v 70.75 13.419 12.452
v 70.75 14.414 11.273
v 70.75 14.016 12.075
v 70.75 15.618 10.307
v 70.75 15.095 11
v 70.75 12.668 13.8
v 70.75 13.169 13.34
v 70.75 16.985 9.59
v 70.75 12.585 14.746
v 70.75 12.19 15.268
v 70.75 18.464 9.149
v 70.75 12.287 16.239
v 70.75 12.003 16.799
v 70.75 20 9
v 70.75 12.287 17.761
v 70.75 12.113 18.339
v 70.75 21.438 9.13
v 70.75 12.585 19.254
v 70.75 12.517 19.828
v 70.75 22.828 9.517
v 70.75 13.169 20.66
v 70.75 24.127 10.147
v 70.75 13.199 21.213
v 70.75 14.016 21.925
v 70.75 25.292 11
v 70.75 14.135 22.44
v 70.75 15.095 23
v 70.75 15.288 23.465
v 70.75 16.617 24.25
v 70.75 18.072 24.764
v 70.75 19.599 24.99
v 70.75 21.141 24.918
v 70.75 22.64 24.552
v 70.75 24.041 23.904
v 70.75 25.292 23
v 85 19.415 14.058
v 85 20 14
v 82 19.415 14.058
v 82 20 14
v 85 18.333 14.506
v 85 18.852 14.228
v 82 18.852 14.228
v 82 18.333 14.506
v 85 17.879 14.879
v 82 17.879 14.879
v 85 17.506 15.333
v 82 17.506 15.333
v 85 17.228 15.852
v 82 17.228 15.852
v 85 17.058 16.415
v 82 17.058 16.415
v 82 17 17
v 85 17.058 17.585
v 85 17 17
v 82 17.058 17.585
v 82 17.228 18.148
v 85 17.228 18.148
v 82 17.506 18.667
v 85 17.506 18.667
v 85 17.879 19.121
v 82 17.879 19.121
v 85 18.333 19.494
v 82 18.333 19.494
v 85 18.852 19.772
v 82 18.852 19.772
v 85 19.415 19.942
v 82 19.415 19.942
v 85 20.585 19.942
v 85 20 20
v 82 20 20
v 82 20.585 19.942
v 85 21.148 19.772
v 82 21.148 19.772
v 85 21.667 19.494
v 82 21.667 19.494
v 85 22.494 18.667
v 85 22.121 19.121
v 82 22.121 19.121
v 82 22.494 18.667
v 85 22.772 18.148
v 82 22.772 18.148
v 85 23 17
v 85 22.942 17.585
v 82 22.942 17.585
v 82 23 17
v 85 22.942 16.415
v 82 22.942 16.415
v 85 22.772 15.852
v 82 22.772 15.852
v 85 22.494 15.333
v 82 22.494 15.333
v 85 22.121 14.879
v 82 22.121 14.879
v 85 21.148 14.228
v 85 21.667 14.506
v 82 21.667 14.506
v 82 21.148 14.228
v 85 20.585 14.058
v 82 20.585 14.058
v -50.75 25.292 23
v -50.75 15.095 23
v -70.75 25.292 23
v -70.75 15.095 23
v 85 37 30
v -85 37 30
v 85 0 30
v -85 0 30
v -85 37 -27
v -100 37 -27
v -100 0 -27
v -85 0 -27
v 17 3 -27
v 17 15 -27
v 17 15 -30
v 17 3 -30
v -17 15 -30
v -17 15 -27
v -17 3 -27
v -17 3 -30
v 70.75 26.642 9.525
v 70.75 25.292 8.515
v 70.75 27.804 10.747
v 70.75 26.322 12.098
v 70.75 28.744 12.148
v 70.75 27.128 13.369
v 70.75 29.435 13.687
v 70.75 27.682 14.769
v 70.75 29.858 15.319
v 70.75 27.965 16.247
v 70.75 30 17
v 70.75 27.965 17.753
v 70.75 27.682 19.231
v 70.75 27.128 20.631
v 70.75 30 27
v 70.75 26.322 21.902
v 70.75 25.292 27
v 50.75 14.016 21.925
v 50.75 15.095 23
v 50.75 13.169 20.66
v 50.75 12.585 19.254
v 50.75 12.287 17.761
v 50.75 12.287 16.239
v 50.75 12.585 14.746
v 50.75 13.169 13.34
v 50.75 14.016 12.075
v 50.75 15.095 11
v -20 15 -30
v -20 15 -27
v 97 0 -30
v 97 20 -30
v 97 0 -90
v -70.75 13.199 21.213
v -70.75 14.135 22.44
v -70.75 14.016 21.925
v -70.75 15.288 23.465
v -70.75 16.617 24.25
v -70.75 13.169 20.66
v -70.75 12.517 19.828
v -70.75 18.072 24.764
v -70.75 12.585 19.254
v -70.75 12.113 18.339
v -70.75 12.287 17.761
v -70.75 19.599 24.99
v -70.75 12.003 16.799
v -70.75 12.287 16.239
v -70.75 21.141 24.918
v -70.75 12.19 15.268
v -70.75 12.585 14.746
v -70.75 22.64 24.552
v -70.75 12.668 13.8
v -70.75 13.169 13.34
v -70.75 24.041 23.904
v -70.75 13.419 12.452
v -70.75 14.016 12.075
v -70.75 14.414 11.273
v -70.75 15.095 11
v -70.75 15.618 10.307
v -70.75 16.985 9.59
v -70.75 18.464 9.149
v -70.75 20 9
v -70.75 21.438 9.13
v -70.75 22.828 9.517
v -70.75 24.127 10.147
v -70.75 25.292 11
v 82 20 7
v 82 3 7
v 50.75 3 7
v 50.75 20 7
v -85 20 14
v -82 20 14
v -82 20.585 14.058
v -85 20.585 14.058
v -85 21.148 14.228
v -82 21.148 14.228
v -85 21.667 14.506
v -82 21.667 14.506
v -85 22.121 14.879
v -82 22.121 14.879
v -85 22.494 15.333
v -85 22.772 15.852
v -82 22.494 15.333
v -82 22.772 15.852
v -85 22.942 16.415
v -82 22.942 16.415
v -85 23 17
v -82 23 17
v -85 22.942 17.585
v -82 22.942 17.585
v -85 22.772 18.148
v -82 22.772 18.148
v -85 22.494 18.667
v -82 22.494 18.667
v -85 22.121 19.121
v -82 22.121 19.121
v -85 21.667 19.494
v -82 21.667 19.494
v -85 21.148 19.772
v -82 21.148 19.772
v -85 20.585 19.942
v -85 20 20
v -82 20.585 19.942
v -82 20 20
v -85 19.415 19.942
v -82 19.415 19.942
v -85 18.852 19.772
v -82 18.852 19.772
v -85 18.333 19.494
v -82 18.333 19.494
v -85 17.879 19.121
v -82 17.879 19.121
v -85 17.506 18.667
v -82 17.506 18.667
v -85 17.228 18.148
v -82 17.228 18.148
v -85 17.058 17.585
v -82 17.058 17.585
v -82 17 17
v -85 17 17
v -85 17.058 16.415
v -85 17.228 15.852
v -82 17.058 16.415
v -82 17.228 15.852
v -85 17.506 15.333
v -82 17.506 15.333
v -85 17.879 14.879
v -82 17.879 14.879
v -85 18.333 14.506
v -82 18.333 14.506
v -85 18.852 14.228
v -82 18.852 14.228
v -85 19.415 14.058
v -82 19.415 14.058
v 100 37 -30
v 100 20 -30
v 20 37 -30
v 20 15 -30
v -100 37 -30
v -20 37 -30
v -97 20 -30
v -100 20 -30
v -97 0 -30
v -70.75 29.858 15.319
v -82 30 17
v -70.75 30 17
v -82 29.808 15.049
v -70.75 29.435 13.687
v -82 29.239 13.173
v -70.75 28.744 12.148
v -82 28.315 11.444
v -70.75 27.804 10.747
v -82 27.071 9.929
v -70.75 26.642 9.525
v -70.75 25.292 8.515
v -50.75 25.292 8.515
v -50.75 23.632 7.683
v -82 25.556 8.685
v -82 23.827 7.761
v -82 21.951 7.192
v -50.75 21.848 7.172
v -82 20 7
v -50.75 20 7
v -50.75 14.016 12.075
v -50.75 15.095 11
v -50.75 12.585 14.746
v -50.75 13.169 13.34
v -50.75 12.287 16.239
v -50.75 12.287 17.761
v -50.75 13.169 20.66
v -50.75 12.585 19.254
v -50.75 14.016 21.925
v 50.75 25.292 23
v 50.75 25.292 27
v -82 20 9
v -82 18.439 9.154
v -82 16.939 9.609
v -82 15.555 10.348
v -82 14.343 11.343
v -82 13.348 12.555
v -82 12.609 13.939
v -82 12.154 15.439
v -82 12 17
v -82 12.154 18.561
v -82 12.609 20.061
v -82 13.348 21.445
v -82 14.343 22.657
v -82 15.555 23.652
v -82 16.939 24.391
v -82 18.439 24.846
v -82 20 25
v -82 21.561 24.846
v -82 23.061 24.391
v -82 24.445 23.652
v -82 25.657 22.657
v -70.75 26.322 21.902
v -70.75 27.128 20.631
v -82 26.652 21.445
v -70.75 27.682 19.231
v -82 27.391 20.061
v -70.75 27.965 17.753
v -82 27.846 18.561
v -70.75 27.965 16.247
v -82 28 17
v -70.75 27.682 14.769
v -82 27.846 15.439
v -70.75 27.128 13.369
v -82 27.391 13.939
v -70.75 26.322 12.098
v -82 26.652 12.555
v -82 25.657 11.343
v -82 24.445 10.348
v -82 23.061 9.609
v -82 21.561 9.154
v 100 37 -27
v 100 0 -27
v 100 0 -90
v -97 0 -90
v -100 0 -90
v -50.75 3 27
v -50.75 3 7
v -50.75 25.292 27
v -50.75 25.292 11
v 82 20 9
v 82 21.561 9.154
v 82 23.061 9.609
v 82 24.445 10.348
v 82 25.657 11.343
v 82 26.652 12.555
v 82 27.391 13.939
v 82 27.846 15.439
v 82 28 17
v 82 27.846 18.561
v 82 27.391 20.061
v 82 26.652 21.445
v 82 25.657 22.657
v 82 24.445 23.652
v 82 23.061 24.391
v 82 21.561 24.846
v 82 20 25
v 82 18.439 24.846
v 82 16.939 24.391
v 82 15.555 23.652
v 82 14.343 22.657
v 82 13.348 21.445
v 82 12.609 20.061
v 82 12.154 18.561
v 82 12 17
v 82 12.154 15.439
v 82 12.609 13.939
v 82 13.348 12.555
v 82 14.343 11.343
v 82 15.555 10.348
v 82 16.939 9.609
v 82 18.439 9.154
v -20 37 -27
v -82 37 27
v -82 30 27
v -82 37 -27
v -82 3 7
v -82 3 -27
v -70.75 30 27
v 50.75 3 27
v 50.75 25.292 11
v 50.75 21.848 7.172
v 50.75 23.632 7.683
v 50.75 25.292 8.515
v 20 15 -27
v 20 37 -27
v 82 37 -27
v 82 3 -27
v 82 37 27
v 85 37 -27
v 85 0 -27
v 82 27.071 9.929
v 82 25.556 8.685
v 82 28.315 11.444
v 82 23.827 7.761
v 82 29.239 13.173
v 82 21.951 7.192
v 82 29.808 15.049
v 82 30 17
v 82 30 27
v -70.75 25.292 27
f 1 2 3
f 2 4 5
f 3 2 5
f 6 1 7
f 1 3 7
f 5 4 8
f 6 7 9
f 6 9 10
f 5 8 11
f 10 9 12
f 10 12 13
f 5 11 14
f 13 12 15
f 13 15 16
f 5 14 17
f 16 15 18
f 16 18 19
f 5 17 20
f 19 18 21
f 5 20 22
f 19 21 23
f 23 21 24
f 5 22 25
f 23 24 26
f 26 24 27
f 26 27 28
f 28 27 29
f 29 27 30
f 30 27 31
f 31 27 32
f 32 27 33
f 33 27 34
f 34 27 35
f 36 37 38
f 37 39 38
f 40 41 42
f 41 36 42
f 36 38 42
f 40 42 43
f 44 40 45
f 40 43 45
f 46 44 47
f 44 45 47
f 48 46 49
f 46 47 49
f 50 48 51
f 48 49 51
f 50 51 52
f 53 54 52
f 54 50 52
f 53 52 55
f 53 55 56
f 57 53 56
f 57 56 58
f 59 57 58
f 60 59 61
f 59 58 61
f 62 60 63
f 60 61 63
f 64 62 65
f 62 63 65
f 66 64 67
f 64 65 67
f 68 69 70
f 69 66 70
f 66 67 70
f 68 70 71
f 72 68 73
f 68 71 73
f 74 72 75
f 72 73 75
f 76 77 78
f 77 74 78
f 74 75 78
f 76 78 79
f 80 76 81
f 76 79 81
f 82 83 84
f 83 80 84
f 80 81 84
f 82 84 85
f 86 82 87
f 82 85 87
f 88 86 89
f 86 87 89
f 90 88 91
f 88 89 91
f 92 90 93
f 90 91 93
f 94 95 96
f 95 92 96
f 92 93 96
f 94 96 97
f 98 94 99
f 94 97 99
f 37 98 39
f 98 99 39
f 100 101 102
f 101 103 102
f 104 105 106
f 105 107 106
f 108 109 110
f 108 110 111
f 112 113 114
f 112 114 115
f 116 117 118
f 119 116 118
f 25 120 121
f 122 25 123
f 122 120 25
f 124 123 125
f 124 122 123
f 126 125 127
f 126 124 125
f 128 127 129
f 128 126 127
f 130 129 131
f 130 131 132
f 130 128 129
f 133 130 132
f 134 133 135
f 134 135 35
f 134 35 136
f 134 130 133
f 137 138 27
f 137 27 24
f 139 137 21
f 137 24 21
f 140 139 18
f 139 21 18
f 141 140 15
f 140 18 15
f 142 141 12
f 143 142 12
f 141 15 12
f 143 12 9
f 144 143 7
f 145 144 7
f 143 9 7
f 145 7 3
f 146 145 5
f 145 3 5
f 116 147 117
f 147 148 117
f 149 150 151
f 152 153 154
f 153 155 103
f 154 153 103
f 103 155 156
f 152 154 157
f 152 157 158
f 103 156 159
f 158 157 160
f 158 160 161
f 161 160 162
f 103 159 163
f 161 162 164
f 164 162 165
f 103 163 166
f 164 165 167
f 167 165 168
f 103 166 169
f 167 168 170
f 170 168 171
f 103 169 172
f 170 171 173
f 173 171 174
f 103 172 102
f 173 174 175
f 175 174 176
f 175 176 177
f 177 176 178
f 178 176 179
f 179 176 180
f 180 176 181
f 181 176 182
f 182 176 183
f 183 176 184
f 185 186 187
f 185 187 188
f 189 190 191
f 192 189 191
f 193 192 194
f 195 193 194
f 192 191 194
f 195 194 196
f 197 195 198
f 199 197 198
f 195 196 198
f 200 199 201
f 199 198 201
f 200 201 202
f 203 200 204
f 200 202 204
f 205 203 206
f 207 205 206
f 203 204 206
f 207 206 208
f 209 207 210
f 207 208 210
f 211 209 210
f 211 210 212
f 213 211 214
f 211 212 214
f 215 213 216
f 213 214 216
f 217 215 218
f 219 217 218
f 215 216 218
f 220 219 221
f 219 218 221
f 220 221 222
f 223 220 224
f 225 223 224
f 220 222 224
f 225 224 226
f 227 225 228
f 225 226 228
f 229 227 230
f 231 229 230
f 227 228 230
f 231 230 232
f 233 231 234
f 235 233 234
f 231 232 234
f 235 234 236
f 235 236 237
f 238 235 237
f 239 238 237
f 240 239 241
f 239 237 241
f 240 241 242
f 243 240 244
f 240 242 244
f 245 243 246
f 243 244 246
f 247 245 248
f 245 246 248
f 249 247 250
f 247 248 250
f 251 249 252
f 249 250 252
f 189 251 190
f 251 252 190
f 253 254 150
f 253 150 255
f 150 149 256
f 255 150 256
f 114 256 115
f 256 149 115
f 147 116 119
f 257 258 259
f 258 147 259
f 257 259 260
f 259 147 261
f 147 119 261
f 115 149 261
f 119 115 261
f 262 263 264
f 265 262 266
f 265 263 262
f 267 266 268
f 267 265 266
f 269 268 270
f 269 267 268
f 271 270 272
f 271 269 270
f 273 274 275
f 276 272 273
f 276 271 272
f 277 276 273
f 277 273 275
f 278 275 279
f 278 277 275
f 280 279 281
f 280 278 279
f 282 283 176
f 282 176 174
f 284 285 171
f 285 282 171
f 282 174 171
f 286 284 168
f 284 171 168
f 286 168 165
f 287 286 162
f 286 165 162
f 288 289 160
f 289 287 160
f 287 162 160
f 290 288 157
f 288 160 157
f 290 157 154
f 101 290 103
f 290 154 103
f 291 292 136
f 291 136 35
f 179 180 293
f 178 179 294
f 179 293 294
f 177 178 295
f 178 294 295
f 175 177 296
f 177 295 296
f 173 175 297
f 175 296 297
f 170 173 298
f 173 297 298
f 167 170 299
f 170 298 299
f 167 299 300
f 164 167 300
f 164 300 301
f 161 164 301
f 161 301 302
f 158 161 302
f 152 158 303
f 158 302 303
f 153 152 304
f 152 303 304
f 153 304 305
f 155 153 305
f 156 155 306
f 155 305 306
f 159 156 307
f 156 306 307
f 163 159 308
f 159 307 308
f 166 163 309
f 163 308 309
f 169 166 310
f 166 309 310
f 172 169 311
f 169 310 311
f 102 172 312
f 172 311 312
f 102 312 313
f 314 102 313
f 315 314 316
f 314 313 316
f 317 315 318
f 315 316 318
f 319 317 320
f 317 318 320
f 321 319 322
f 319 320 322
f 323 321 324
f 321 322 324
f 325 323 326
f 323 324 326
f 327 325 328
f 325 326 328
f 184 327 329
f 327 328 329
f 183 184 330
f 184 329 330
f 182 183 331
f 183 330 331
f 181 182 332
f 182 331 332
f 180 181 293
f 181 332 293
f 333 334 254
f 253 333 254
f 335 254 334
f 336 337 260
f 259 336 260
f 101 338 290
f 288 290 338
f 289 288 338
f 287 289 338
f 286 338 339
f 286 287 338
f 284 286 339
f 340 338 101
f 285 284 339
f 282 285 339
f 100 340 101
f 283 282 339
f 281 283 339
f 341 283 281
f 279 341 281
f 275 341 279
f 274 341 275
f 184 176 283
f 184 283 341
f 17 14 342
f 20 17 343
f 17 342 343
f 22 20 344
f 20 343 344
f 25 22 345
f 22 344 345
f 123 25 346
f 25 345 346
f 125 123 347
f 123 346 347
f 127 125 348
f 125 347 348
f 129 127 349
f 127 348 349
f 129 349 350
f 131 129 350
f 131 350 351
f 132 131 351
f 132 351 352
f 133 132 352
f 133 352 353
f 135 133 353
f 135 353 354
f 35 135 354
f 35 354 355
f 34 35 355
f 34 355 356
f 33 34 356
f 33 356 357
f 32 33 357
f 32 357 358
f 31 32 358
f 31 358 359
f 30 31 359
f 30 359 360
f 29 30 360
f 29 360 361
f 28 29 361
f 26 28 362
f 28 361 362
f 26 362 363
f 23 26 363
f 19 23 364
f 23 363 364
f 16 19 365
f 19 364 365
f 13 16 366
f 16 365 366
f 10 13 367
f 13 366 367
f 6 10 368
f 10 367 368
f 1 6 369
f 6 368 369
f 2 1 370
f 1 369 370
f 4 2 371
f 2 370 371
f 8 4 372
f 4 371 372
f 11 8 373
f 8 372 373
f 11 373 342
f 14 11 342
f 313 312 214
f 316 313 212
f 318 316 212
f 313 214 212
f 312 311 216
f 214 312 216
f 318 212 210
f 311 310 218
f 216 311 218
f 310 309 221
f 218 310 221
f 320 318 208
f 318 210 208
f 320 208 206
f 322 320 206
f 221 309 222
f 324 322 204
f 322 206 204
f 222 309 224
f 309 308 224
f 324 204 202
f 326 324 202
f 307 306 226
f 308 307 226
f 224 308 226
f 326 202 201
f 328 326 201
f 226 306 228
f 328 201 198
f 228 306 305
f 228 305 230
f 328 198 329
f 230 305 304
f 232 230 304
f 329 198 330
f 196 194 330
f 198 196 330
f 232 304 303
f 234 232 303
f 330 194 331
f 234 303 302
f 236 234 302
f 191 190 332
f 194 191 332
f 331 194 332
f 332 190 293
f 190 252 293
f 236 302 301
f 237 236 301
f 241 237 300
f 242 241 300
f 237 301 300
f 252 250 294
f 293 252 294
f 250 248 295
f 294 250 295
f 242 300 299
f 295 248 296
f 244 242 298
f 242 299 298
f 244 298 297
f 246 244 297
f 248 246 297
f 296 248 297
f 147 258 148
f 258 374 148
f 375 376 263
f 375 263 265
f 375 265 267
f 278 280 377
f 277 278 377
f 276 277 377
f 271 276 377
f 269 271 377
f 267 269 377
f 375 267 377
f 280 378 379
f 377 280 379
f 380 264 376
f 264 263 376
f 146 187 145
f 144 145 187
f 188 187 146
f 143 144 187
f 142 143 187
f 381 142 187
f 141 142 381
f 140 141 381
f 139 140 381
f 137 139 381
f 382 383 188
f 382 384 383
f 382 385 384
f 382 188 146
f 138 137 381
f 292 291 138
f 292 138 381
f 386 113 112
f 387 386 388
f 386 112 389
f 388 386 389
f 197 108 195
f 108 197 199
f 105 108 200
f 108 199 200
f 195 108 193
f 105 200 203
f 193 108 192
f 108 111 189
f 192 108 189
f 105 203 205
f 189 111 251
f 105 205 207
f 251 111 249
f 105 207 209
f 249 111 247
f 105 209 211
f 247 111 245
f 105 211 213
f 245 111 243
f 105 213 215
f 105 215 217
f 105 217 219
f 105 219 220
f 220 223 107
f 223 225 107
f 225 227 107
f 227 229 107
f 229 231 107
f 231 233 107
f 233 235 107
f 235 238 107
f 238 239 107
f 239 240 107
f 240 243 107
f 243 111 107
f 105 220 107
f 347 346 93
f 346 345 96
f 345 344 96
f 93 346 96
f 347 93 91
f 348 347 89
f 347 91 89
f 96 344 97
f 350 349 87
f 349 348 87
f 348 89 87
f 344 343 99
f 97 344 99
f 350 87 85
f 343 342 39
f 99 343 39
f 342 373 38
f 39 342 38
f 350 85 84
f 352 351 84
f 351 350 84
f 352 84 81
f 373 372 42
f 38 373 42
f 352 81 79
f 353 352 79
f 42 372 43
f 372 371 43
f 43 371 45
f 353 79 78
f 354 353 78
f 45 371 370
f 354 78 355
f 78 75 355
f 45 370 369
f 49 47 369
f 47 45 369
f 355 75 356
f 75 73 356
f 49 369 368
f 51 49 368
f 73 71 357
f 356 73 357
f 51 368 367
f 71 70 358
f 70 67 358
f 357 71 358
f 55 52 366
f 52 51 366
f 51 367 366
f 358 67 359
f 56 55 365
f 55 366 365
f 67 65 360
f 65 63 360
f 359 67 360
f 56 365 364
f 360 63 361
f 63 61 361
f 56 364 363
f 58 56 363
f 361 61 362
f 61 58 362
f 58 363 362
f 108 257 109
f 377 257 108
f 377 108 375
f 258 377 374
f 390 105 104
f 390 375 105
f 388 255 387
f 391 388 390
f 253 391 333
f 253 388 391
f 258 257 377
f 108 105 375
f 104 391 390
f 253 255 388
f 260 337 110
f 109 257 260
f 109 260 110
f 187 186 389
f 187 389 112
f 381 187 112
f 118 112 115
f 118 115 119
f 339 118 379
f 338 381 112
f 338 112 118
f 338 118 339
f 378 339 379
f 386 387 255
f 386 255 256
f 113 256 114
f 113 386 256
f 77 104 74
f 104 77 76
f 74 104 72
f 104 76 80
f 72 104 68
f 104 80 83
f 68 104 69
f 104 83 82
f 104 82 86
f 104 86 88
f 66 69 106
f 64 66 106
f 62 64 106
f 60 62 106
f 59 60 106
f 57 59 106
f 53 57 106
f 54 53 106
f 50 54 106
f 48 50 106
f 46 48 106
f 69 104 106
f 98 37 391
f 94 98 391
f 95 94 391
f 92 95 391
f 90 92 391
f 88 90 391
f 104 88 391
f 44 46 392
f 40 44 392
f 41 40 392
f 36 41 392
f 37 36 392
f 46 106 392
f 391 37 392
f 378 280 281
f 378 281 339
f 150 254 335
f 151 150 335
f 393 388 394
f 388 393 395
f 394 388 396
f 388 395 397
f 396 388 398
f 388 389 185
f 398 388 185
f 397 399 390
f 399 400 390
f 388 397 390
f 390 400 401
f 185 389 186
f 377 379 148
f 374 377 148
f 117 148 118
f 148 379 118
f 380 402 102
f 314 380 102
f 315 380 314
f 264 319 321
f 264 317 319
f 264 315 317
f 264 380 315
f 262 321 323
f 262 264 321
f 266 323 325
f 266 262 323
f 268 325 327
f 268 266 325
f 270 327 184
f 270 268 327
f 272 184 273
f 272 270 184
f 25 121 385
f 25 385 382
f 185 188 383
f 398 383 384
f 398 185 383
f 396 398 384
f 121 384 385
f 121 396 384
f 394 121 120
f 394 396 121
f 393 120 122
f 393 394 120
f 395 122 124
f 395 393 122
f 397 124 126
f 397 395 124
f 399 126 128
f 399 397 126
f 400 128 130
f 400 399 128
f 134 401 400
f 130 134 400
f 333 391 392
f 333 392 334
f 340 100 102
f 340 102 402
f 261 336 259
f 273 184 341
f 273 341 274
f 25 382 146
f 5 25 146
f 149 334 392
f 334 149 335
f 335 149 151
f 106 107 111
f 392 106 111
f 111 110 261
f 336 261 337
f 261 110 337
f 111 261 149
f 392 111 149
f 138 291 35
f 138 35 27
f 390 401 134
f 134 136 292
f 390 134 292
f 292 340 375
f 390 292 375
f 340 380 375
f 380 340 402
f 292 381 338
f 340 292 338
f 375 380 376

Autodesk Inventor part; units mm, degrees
ref_plane "YZ Plane" through (0, 0, 0) normal (1, 0, 0) x (0, 1, 0)
ref_plane "XZ Plane" through (0, 0, 0) normal (0, 1, 0) x (-1, 0, 0)
ref_plane "XY Plane" through (0, 0, 0) normal (0, 0, 1) x (1, 0, 0)
sketch "Sketch1" plane through (0, 0, 0) normal (0, 1, 0) x (-1, 0, 0)
  line L0 (85, 30) -> (-85, 30)
  line L1 (-85, 30) -> (-85, -30)
  line L2 (-85, -30) -> (85, -30)
  line L3 (85, -30) -> (85, 30)
  line L4 (85, 30) -> (-85, -30) construction
  line L5 (-85, 30) -> (85, -30) construction
  line L6 (-85, -30) -> (-100, -30)
  line L7 (-100, -30) -> (-100, -27)
  line L8 (-100, -27) -> (-85, -27)
  line L9 (0, -42) -> (0, 42) projected
  line L10 (85, -30) -> (100, -30)
  line L11 (100, -30) -> (100, -27)
  line L12 (100, -27) -> (85, -27)
  point P0 (0, 0)
  point P1 (85, -27)
  dimension "d0" = 170
  dimension "d1" = 60
  dimension "d32" = 15
  dimension "d33" = 3
extrude "Extrusion1" add sketch "Sketch1" along normal blind 3
sketch "Sketch2" plane through (0, 3, 0) normal (0, 1, 0) x (1, 0, 0)
  line L0 (-85, 27) -> (-85, -30) projected
  line L1 (-85, -30) -> (85, -30) projected
  line L2 (85, -30) -> (85, 27) projected
  line L3 (100, 30) -> (-100, 30) projected
  line L4 (-100, 30) -> (-100, 27) projected
  line L5 (-100, 27) -> (-85, 27) projected
  line L6 (85, 27) -> (100, 27) projected
  line L7 (100, 27) -> (100, 30) projected
  line L8 (82, -27) -> (-82, -27)
  line L9 (-82, -27) -> (-82, 27)
  line L10 (-82, 27) -> (82, 27)
  line L11 (82, 27) -> (82, -27)
  line L12 (82, -27) -> (-82, 27) construction
  line L13 (-82, -27) -> (82, 27) construction
  point P0 (0, 0)
  dimension "d36" = 164
  dimension "d37" = 54
extrude "Extrusion2" add sketch "Sketch2" along normal blind 34
sketch "Sketch7" plane through (-82, 3, 27) normal (1, 0, 0) x (0, 0, -1)
  circle A0 centre (10, 17) radius 8
  line L0 (54, -3) -> (-3, -3) projected
  circle A1 centre (10, 17) radius 10
  line L1 (0, 17) -> (0, 0)
  line L2 (0, 17) -> (20, 17)
  line L3 (20, 17) -> (20, 0)
  line L4 (-3, -3) -> (-3, 34) projected
  line L5 (0, 0) -> (20, 0)
  line L6 (10, 27) -> (0, 27)
  line L7 (0, 0) -> (0, 34) projected
  line L8 (0, 17) -> (0, 27)
  point P0 (27, -3)
  point P1 (57, -3)
  dimension "d17" = 16
  dimension "d18" = 20
  dimension "d20" = 2
  dimension "d40" = 20
  dimension "d62" = 10
extrude "Extrusion5" add sketch "Sketch7" along normal blind 11.25 contours L2 A1 A0 | A0 L2 A1 | L3 L5 L1 A1 | L7 L6 A1
sketch "Sketch8" plane through (-70.75, 3, 27) normal (1, 0, 0) x (0, 0, -1)
  arc A0 (20, 17) -> (10, 27) centre (10, 17) ccw projected
  circle A1 centre (10, 17) radius 8 projected
  line L0 (0, 0) -> (0, 27) projected
  line L1 (20, 0) -> (0, 0) projected
  line L2 (20, 0) -> (20, 17) projected
  circle A2 centre (10, 17) radius 7.75
  line L3 (10, 27) -> (0, 27) projected
  line L4 (0, 0) -> (0, 27) projected
  line L5 (4, 12.0946) -> (4, 22.2915)
  line L6 (10, 27) -> (0, 27) projected
  line L7 (16, 12.0946) -> (16, 22.2915)
  line L8 (16, 22.2915) -> (18.4853, 22.2915)
  arc A3 (20, 17) -> (10, 27) centre (10, 17) ccw projected
  line L9 (4, 22.2915) -> (0, 22.2915)
  point P0 (27, -3)
  point P1 (4, 27)
  point P2 (18.4853, 22.2915)
  point P3 (4, 21.9054)
  point P4 (16, 21.9054)
  dimension "d55" = 15.5
  dimension "d63" = 12
  dimension "d64" = 6
extrude "Extrusion6" add sketch "Sketch8" along normal blind 20 contours L2 L1 L0 L9 A1 L8 A0 | A1 L5 A2 L7 | A2 L7 | L5 A2 picked at (9.114, 9.2488)
sketch "Sketch9" plane through (-82, 20, 17) normal (1, 0, 0) x (0, 0, -1)
  circle A0 centre (0, 0) radius 3
  line L0 (44, -20) -> (-13, -20) projected
  line L1 (-13, -20) -> (-13, 17) projected
  point P0 (17, -20)
  point P1 (47, -20)
  dimension "d27" = 6
  dimension "d28" = 20
  dimension "d41" = 13
extrude "Extrusion7" cut sketch "Sketch9" against normal up to surface (3 mm away)
mirror "Mirror2" about plane through (0, 0, 0) normal (1, 0, 0) of "Extrusion7", "Extrusion6", "Extrusion5"
sketch "Sketch4" plane through (-87, 3, -27) normal (0, 0, 1) x (1, 0, 0)
  line L0 (87, 34) -> (107, 34)
  line L1 (87, 34) -> (67, 34)
  line L2 (67, 34) -> (67, 0)
  line L3 (107, 34) -> (107, 0)
  line L4 (107, 0) -> (67, 0)
  line L5 (5, 0) -> (5, 34) projected
  line L6 (5, 34) -> (169, 34) projected
  line L7 (67, 12) -> (70, 12)
  line L8 (70, 12) -> (70, 0)
  line L9 (107, 12) -> (104, 12)
  line L10 (104, 12) -> (104, 0)
  point P0 (87, -3)
  dimension "d13" = 20
  dimension "d14" = 20
  dimension "d42" = 82
  dimension "d43" = 34
  dimension "WeaponMountThickness" = 3
  dimension "WeaponMountSlot" = 12
extrude "Extrusion9" cut sketch "Sketch4" against normal up to surface (3 mm away) contours L0 L3 L9 L10 L4 L8 L7 L2 L1
sketch "Sketch13" plane through (100, 0, -27) normal (1, 0, 0) x (0, 0, -1)
  line L0 (0, 0) -> (3, 0) projected
  line L1 (3, 0) -> (3, 20)
  line L2 (0, 0) -> (0, 37) projected
  line L3 (3, 20) -> (63, 0)
  line L4 (63, 0) -> (3, 0)
  point P0 (-27, 0)
  dimension "d60" = 60
  dimension "d61" = 20
extrude "Extrusion11" add sketch "Sketch13" against normal blind 3
mirror "Mirror4" about plane through (0, 0, 0) normal (1, 0, 0) of "Extrusion11"
sketch "Sketch14" plane through (0, 3, 0) normal (0, 1, 0) x (1, 0, 0)
  point P0 (0, 0)
equation "\"d0\" = Width"
equation "\"d1\" = Length"
equation "\"d32\" = -0.5 * Width + 0.5 * FullWidth"
equation "\"d33\" = SideWallThickness"
equation "\"d2\" = BaseWallThickness"
equation "\"d36\" = Width - 2 * SideWallThickness"
equation "\"d37\" = Length - 2 * SideWallThickness"
equation "\"d5\" = Height - 2 * BaseWallThickness"
equation "\"d18\" = DriveMotorHeight"
equation "\"d20\" = DriveMotorMountThickness"
equation "\"d28\" = DriveMotorHeight"
equation "\"d13\" = 0.5 * WeaponSlotWidth"
equation "\"d14\" = 0.5 * WeaponSlotWidth"
equation "\"d42\" = 0.5 * Width - SideWallThickness"
equation "\"d43\" = Height - 2 * BaseWallThickness"
equation "\"d60\" = WedgeLength"
equation "\"d61\" = WedgeHeight"
equation "\"d53\" = SideWallThickness"
equation "\"SideWallThickness\" = 3"
equation "\"BaseWallThickness\" = 3"
equation "\"Width\" = 170"
equation "\"Length\" = 60"
equation "\"DriveMotorHeight\" = 20"
equation "\"DriveMotorMountThickness\" = 2"
equation "\"WedgeLength\" = 60"
equation "\"WedgeHeight\" = 20"
equation "\"FullWidth\" = 200"
equation "\"Height\" = 40"
equation "\"WeaponSlotWidth\" = 40"
properties part number "BodyV2" material "Thermoplastic Resin"
